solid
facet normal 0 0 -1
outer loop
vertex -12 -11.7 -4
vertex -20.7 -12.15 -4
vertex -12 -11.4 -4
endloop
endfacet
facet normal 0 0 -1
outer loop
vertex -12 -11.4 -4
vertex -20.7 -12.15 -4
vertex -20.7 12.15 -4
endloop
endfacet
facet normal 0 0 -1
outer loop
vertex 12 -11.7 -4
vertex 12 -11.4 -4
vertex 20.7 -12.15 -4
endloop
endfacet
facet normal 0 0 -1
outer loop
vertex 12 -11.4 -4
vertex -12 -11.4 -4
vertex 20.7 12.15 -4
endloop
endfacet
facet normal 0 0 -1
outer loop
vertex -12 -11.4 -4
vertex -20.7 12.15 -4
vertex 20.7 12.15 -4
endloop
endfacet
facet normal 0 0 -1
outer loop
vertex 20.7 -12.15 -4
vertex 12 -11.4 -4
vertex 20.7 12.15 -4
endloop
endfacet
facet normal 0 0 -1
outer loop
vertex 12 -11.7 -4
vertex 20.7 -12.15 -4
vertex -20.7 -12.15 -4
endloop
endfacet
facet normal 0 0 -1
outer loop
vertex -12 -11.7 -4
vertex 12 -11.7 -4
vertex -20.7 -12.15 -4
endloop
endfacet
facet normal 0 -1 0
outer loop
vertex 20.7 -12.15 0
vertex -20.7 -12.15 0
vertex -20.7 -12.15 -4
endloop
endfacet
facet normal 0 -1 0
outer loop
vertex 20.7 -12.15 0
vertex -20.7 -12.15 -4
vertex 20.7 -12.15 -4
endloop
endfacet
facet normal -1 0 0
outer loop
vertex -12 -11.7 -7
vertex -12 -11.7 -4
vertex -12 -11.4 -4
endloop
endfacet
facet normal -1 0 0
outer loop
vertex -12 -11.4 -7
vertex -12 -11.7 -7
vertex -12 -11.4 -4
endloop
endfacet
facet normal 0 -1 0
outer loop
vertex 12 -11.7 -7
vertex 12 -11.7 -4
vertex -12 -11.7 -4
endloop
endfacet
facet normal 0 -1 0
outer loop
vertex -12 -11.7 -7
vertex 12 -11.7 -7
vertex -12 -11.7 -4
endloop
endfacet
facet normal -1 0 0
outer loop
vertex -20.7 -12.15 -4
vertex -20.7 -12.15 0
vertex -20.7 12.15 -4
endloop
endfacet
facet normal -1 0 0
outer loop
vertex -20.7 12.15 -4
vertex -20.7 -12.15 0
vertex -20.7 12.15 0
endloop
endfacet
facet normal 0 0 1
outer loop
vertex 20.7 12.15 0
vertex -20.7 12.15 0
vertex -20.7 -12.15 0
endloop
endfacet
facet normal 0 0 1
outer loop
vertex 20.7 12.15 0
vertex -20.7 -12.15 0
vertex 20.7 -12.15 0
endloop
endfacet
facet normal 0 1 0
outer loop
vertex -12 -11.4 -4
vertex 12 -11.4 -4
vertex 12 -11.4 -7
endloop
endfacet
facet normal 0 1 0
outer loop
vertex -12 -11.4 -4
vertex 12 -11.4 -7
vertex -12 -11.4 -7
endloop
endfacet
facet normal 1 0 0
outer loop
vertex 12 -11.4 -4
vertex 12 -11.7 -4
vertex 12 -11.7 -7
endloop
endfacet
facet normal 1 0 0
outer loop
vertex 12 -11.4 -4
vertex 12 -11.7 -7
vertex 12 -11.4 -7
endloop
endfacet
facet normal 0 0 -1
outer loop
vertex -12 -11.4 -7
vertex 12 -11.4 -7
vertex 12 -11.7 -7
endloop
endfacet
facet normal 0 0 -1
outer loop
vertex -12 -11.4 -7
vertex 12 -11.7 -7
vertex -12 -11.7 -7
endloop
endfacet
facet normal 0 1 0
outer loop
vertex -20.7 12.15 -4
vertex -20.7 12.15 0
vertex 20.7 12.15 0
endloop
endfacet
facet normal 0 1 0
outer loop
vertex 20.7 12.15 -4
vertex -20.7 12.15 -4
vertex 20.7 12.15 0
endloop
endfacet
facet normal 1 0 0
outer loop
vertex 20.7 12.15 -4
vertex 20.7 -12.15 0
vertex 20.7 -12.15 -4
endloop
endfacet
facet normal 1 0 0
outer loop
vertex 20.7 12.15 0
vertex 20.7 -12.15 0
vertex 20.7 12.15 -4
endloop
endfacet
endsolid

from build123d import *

# Parameters (mm, degrees)
SKETCH1_W           = 41.4
SKETCH1_H           = 24.3
BOSS_EXTRUDE1_DEPTH = 4
SKETCH2_W           = 24
SKETCH2_H           = 0.3
BOSS_EXTRUDE2_DEPTH = 3


with BuildPart() as part:
    # Sketch1 → Boss-Extrude1 (new body)
    with BuildSketch(Plane.XY):
        Rectangle(SKETCH1_W, SKETCH1_H)
    extrude(amount=-BOSS_EXTRUDE1_DEPTH)

    # Sketch2 → Boss-Extrude2 (add)
    with BuildSketch(Plane(origin=(0, 0, -4), x_dir=(-1, 0, 0), z_dir=(0, 0, -1))):
        with Locations((0, -11.55)):
            Rectangle(SKETCH2_W, SKETCH2_H)
    extrude(amount=BOSS_EXTRUDE2_DEPTH)


solid = part.part
